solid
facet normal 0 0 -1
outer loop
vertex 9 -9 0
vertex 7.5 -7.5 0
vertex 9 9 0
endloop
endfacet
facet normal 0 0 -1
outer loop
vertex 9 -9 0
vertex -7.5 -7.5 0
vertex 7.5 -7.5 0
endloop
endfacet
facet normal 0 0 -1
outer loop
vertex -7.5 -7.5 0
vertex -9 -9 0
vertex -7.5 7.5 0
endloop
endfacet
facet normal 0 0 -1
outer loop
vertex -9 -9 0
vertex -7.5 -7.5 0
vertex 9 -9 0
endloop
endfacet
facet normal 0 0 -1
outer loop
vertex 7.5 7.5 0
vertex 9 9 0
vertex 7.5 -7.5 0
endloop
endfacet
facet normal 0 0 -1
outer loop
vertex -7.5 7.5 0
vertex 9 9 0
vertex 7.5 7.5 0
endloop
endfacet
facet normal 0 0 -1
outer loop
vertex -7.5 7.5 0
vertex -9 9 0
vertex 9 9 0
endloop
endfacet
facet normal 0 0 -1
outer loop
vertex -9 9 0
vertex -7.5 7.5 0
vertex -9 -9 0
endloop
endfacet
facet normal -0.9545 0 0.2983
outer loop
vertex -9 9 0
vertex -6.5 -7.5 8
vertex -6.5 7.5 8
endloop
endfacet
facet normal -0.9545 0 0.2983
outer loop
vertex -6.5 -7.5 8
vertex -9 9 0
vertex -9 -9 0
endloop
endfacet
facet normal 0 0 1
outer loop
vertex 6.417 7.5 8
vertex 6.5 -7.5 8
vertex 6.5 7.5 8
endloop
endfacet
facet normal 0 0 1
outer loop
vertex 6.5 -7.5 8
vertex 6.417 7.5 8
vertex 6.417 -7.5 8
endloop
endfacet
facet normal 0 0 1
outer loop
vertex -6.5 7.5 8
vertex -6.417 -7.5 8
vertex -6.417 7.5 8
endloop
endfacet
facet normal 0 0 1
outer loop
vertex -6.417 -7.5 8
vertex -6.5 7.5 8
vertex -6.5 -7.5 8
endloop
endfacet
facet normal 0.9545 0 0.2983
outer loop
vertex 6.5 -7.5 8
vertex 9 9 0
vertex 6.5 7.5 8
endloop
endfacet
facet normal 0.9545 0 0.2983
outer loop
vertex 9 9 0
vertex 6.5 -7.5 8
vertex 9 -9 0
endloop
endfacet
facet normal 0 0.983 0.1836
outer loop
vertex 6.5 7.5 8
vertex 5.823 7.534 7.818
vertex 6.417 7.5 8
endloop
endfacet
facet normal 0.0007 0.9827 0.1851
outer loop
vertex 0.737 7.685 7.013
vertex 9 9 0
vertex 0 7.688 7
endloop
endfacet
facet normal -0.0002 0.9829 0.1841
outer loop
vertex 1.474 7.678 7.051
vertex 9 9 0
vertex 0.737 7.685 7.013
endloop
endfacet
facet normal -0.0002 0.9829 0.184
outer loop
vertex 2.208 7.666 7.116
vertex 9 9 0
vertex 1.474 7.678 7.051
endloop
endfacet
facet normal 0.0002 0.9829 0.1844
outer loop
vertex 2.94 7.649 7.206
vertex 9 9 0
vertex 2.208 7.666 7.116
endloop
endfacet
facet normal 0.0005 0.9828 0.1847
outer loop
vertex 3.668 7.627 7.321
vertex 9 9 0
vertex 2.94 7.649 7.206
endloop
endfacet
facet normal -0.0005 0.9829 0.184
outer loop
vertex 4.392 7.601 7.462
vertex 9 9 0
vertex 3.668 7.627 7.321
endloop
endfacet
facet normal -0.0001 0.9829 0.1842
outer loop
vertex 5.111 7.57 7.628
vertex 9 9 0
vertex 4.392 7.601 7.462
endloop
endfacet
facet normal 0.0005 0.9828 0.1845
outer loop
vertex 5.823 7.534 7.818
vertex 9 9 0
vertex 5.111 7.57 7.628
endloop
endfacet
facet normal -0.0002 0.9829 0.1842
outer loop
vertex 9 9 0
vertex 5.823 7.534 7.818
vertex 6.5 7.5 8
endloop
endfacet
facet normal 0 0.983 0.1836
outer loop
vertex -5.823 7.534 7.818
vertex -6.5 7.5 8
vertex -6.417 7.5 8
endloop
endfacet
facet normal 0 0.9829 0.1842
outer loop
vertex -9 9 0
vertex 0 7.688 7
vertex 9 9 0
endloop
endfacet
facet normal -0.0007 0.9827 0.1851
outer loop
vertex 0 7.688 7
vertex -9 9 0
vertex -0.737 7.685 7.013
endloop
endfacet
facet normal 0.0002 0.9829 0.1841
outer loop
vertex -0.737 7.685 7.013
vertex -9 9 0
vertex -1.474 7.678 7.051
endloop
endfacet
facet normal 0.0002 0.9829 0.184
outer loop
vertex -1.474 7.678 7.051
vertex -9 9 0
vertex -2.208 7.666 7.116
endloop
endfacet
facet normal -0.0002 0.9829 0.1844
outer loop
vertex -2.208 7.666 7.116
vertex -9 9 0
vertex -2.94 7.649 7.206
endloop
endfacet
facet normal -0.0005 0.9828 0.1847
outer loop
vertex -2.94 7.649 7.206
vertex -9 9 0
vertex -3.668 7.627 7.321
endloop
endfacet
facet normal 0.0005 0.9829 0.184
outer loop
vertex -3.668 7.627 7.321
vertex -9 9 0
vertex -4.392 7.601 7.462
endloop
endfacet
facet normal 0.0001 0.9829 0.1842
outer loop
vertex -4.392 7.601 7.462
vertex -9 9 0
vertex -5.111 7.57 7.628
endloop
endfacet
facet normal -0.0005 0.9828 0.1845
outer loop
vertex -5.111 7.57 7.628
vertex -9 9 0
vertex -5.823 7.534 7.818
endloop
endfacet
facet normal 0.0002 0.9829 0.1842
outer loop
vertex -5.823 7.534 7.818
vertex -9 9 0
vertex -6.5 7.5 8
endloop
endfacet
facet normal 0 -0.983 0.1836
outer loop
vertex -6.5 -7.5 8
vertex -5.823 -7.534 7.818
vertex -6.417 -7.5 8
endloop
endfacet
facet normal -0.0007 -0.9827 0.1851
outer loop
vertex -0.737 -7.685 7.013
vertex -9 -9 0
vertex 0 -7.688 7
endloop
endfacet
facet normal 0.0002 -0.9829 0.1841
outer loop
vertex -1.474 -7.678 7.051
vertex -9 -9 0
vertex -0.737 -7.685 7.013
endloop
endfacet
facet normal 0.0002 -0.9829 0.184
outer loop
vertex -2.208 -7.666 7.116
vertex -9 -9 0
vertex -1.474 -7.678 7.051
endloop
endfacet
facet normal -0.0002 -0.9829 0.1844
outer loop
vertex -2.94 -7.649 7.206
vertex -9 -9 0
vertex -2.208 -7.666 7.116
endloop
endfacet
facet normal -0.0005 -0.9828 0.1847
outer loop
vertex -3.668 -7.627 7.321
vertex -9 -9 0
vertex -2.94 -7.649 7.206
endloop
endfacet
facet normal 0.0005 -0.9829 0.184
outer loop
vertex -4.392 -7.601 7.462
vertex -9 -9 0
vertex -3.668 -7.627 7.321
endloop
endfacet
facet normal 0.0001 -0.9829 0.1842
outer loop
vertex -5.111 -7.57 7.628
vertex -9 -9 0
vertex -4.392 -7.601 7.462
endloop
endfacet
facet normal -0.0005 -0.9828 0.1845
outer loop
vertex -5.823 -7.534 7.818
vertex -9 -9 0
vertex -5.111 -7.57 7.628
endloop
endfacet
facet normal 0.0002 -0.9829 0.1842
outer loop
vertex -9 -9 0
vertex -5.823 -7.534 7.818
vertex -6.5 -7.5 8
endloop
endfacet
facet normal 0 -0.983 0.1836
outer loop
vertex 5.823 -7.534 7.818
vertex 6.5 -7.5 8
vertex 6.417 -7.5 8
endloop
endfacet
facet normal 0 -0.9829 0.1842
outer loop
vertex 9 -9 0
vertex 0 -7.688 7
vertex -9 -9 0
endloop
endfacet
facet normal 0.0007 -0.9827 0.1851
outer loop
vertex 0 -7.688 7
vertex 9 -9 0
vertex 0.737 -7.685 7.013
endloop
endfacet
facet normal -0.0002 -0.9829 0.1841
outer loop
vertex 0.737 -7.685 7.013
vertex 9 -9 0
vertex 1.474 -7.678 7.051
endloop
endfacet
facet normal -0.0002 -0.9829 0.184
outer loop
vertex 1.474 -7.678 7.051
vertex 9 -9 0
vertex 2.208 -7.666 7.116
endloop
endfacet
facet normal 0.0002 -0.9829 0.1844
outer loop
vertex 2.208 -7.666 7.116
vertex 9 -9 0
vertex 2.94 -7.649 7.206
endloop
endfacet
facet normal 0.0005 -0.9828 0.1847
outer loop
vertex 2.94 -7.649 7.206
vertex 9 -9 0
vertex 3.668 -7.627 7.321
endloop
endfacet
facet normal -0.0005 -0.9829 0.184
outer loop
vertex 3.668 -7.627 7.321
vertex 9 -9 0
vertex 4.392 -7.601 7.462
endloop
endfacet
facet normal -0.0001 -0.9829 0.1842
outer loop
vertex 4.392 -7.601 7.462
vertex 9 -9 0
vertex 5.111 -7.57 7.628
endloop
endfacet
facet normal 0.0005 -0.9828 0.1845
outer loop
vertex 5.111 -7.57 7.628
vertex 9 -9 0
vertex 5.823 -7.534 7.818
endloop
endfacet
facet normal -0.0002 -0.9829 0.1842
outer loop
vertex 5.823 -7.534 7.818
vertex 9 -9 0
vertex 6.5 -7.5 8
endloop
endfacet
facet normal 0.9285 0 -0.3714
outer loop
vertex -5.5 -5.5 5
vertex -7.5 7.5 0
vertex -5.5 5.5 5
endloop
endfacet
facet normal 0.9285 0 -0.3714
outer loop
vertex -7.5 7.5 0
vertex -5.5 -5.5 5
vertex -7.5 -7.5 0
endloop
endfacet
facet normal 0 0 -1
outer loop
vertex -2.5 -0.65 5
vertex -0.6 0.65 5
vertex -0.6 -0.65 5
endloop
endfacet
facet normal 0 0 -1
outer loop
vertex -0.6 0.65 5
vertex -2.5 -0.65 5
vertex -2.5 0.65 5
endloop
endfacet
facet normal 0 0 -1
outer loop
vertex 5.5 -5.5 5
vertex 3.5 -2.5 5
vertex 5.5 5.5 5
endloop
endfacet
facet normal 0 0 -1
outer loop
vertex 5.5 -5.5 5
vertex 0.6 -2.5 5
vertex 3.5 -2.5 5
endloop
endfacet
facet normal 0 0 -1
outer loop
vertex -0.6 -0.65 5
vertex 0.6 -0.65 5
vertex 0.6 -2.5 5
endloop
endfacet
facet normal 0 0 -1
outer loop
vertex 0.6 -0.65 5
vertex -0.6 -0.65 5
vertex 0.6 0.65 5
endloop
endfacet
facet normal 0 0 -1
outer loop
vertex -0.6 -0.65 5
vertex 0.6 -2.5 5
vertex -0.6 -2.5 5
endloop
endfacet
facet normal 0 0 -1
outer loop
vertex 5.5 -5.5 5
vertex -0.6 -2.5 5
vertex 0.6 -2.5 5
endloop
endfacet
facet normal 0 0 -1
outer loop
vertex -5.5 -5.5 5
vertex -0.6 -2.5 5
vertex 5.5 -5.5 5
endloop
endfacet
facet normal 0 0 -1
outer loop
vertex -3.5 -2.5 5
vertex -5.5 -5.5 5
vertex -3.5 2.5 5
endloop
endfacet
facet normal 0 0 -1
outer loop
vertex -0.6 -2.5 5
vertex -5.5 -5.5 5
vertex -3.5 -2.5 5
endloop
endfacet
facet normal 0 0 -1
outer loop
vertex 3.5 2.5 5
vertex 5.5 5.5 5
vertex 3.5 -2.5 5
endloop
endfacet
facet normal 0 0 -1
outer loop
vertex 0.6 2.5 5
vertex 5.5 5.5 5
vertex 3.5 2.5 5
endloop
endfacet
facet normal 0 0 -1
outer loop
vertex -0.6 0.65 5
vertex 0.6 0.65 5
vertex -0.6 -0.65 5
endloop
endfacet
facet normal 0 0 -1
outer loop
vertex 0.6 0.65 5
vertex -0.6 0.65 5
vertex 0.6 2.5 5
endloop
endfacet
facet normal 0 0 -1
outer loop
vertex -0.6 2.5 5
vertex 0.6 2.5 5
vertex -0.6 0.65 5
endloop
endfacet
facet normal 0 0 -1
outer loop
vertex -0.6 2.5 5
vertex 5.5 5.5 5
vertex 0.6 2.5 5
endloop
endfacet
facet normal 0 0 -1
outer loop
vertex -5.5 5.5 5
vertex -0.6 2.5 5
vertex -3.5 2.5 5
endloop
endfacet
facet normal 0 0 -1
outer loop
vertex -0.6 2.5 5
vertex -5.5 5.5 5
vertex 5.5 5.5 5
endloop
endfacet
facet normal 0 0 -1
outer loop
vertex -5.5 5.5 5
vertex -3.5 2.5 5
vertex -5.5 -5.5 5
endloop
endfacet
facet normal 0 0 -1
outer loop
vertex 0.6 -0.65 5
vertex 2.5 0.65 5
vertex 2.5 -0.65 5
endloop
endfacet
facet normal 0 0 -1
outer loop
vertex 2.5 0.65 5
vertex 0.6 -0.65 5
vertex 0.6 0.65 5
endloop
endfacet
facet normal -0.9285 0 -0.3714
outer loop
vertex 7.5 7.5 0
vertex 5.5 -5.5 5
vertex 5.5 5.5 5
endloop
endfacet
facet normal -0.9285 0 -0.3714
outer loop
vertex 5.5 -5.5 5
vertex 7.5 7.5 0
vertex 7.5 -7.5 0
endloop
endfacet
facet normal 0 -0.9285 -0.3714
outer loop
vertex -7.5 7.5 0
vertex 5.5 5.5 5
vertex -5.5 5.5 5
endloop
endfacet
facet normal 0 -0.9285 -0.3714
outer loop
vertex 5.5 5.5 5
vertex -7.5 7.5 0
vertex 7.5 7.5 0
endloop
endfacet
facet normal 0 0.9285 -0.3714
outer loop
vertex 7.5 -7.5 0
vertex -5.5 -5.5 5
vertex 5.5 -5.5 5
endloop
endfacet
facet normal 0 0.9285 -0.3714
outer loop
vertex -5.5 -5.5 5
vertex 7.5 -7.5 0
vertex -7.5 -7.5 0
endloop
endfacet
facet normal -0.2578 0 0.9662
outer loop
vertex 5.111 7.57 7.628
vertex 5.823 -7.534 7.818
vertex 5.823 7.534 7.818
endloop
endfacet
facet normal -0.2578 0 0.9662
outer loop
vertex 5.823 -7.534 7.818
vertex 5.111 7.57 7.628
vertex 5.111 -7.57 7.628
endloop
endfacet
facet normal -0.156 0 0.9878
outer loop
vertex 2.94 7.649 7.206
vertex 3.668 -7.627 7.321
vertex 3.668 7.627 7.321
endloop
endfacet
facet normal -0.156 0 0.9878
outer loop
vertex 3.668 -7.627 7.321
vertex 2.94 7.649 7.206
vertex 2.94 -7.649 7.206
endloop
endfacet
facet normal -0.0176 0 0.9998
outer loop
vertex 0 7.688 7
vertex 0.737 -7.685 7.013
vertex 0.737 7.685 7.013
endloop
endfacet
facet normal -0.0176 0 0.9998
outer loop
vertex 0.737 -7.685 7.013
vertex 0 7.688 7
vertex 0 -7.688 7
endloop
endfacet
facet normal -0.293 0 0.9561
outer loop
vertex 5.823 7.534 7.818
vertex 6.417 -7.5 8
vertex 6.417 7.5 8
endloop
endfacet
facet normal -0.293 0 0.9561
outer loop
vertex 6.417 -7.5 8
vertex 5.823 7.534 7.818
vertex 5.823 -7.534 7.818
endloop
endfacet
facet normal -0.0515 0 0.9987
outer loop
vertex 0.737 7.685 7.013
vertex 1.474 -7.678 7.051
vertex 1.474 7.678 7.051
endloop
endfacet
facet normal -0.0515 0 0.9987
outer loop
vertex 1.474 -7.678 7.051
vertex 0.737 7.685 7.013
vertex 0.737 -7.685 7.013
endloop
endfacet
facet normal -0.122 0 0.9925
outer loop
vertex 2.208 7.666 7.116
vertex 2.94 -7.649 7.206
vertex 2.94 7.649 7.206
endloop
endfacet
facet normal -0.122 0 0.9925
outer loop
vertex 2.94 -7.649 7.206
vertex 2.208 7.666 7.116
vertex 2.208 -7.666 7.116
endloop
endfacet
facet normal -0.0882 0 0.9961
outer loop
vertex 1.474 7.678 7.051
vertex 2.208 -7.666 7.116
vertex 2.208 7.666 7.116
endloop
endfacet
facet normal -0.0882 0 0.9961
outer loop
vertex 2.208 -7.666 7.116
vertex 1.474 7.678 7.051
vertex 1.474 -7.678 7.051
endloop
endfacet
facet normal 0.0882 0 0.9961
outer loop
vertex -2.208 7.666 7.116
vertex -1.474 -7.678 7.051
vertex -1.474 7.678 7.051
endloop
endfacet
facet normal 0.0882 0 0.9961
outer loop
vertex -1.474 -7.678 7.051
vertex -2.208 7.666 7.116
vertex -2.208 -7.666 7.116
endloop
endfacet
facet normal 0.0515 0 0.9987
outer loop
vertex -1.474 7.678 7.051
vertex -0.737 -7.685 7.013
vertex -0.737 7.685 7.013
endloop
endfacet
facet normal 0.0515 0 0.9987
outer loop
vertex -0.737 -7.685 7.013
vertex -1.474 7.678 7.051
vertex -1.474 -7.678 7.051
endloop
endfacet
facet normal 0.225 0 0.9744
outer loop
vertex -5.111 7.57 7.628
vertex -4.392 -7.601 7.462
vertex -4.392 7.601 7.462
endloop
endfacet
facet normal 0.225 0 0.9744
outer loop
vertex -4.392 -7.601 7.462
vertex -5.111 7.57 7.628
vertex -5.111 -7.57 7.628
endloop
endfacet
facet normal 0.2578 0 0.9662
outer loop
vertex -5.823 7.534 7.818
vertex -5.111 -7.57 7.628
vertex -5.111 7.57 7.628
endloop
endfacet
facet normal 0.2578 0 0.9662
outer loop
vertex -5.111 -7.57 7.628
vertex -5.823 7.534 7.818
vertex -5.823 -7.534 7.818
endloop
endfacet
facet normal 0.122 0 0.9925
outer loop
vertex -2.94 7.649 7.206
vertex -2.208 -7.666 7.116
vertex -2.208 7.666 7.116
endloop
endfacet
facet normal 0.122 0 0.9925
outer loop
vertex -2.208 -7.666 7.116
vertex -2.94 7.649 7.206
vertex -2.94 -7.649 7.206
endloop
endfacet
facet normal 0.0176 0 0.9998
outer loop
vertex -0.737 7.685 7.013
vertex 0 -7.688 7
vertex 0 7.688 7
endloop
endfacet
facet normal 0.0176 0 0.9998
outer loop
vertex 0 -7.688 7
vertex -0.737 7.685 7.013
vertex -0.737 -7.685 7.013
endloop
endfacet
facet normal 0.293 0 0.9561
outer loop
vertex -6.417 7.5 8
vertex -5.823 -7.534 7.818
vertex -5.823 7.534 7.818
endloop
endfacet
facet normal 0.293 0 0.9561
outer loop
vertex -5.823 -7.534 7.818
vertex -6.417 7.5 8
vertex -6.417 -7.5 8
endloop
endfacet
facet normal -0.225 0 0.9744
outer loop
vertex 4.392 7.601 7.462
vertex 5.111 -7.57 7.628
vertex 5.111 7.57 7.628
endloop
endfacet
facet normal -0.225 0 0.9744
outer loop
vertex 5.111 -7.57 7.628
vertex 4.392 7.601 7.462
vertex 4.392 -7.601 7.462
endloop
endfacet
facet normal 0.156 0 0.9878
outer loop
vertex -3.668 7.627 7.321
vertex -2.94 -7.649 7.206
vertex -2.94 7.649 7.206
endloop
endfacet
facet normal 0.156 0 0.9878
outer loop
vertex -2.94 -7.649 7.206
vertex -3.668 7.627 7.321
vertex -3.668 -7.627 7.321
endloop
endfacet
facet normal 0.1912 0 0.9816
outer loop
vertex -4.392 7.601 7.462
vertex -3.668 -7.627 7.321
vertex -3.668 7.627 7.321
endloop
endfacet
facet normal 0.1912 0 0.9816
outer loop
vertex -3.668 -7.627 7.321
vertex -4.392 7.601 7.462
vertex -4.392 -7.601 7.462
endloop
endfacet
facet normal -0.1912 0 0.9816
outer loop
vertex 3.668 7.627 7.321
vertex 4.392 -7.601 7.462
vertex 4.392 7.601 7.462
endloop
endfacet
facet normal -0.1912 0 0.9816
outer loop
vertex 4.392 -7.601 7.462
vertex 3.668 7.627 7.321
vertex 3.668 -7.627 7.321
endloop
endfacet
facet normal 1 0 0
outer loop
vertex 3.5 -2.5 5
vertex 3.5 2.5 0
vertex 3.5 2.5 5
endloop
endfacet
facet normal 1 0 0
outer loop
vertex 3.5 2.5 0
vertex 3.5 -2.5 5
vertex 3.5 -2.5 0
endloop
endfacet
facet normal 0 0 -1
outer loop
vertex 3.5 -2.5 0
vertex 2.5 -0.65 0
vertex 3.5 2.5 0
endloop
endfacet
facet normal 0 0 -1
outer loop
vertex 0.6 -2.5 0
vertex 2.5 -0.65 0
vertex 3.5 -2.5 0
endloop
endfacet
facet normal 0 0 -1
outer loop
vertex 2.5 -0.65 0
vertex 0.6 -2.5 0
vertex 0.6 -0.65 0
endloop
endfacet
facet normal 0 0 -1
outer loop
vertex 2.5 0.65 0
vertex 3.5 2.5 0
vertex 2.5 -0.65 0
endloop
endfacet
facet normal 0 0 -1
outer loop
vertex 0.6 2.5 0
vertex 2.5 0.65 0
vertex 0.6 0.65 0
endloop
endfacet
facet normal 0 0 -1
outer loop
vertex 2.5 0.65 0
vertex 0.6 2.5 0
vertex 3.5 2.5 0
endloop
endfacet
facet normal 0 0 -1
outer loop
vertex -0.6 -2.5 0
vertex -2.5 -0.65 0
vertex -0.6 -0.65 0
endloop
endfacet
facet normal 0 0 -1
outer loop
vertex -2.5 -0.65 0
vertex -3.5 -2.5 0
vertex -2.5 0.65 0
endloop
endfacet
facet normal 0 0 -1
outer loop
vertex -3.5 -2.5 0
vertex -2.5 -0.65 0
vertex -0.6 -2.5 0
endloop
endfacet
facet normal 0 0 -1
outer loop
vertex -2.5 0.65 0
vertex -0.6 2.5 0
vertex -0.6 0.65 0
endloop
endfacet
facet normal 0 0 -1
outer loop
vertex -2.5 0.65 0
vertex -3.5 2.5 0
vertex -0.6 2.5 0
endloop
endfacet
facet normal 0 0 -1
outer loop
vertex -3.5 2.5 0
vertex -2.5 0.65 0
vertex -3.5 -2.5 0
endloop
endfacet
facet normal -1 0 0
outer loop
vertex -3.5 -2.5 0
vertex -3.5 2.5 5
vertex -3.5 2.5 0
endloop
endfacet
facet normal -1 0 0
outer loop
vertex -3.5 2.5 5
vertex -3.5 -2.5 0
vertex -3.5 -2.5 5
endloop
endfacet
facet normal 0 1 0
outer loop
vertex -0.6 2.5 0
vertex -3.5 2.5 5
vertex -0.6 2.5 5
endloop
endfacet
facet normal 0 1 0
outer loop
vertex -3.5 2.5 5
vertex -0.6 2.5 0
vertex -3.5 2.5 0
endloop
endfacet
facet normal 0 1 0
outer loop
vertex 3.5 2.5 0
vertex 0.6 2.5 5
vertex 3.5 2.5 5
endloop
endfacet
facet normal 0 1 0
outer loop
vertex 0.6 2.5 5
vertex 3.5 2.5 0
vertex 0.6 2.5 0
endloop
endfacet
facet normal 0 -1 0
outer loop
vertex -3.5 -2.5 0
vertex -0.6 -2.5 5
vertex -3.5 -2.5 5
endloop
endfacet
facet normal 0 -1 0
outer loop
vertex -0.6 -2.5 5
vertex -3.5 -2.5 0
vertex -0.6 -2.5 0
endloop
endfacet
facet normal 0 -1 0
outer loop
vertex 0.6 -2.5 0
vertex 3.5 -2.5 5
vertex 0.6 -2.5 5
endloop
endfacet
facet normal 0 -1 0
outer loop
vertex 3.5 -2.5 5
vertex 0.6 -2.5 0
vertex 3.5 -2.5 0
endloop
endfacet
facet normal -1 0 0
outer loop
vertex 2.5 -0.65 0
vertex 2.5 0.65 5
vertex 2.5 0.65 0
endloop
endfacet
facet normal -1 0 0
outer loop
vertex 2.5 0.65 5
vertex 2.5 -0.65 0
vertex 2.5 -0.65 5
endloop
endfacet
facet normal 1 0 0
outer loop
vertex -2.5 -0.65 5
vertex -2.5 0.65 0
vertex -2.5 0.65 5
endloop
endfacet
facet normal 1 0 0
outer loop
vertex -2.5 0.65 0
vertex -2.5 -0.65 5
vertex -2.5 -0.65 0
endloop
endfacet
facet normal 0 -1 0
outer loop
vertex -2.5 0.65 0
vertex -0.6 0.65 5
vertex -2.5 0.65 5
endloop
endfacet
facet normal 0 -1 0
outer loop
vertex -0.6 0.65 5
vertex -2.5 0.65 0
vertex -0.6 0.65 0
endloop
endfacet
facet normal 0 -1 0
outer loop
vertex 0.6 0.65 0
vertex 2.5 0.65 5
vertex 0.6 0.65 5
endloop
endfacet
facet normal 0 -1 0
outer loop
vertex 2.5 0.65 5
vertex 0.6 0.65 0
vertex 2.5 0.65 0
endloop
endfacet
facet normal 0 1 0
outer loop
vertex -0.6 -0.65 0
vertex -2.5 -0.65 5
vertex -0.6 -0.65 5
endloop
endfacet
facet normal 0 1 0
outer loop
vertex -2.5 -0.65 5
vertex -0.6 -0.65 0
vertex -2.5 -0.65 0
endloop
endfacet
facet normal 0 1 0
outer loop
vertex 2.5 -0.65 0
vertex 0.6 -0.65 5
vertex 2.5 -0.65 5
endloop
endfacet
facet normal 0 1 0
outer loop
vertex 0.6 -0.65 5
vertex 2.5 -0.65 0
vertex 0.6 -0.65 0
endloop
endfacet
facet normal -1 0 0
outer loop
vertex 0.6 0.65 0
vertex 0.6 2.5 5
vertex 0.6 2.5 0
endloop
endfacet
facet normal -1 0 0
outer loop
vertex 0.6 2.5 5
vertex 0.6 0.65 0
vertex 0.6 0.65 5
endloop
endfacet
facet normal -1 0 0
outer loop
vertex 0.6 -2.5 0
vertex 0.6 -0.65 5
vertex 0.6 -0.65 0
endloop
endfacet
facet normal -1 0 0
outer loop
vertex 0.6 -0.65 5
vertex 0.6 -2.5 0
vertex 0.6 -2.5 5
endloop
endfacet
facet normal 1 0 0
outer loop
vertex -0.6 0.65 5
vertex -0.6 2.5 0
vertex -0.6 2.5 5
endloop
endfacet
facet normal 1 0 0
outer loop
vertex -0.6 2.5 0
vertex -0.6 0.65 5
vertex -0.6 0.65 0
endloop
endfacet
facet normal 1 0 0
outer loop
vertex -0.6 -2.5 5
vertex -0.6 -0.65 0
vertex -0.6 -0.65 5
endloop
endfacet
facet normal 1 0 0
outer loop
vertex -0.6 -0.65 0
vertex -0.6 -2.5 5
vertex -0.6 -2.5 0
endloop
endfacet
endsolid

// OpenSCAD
key_height = 8;
bottom_size = 18;
top_x_size = 13;
top_y_size = 15;

union() {
  difference() {
    linear_extrude(height = key_height, scale = [top_x_size / bottom_size, top_y_size / bottom_size]) {
      square(size=bottom_size, center=true);
    }
    linear_extrude(height = 5, scale = [11/(bottom_size-3), 11/(bottom_size-3)]) {
      square(size=bottom_size-3, center=true);
    }
    rotate([90, 0, 0]) {
      translate([0, 20.125 + key_height, 0]) {
        cylinder(r=21.125, h = top_y_size + 2, center = true, $fn=180);
      }
    }
  }
  translate([0, 0, 3]) {
    difference() {
      cube([7, 5, 6], center=true);
      cube([5, 1.3, 12], center=true);
      cube([1.2, 6, 12], center=true);
    }
  }
}
